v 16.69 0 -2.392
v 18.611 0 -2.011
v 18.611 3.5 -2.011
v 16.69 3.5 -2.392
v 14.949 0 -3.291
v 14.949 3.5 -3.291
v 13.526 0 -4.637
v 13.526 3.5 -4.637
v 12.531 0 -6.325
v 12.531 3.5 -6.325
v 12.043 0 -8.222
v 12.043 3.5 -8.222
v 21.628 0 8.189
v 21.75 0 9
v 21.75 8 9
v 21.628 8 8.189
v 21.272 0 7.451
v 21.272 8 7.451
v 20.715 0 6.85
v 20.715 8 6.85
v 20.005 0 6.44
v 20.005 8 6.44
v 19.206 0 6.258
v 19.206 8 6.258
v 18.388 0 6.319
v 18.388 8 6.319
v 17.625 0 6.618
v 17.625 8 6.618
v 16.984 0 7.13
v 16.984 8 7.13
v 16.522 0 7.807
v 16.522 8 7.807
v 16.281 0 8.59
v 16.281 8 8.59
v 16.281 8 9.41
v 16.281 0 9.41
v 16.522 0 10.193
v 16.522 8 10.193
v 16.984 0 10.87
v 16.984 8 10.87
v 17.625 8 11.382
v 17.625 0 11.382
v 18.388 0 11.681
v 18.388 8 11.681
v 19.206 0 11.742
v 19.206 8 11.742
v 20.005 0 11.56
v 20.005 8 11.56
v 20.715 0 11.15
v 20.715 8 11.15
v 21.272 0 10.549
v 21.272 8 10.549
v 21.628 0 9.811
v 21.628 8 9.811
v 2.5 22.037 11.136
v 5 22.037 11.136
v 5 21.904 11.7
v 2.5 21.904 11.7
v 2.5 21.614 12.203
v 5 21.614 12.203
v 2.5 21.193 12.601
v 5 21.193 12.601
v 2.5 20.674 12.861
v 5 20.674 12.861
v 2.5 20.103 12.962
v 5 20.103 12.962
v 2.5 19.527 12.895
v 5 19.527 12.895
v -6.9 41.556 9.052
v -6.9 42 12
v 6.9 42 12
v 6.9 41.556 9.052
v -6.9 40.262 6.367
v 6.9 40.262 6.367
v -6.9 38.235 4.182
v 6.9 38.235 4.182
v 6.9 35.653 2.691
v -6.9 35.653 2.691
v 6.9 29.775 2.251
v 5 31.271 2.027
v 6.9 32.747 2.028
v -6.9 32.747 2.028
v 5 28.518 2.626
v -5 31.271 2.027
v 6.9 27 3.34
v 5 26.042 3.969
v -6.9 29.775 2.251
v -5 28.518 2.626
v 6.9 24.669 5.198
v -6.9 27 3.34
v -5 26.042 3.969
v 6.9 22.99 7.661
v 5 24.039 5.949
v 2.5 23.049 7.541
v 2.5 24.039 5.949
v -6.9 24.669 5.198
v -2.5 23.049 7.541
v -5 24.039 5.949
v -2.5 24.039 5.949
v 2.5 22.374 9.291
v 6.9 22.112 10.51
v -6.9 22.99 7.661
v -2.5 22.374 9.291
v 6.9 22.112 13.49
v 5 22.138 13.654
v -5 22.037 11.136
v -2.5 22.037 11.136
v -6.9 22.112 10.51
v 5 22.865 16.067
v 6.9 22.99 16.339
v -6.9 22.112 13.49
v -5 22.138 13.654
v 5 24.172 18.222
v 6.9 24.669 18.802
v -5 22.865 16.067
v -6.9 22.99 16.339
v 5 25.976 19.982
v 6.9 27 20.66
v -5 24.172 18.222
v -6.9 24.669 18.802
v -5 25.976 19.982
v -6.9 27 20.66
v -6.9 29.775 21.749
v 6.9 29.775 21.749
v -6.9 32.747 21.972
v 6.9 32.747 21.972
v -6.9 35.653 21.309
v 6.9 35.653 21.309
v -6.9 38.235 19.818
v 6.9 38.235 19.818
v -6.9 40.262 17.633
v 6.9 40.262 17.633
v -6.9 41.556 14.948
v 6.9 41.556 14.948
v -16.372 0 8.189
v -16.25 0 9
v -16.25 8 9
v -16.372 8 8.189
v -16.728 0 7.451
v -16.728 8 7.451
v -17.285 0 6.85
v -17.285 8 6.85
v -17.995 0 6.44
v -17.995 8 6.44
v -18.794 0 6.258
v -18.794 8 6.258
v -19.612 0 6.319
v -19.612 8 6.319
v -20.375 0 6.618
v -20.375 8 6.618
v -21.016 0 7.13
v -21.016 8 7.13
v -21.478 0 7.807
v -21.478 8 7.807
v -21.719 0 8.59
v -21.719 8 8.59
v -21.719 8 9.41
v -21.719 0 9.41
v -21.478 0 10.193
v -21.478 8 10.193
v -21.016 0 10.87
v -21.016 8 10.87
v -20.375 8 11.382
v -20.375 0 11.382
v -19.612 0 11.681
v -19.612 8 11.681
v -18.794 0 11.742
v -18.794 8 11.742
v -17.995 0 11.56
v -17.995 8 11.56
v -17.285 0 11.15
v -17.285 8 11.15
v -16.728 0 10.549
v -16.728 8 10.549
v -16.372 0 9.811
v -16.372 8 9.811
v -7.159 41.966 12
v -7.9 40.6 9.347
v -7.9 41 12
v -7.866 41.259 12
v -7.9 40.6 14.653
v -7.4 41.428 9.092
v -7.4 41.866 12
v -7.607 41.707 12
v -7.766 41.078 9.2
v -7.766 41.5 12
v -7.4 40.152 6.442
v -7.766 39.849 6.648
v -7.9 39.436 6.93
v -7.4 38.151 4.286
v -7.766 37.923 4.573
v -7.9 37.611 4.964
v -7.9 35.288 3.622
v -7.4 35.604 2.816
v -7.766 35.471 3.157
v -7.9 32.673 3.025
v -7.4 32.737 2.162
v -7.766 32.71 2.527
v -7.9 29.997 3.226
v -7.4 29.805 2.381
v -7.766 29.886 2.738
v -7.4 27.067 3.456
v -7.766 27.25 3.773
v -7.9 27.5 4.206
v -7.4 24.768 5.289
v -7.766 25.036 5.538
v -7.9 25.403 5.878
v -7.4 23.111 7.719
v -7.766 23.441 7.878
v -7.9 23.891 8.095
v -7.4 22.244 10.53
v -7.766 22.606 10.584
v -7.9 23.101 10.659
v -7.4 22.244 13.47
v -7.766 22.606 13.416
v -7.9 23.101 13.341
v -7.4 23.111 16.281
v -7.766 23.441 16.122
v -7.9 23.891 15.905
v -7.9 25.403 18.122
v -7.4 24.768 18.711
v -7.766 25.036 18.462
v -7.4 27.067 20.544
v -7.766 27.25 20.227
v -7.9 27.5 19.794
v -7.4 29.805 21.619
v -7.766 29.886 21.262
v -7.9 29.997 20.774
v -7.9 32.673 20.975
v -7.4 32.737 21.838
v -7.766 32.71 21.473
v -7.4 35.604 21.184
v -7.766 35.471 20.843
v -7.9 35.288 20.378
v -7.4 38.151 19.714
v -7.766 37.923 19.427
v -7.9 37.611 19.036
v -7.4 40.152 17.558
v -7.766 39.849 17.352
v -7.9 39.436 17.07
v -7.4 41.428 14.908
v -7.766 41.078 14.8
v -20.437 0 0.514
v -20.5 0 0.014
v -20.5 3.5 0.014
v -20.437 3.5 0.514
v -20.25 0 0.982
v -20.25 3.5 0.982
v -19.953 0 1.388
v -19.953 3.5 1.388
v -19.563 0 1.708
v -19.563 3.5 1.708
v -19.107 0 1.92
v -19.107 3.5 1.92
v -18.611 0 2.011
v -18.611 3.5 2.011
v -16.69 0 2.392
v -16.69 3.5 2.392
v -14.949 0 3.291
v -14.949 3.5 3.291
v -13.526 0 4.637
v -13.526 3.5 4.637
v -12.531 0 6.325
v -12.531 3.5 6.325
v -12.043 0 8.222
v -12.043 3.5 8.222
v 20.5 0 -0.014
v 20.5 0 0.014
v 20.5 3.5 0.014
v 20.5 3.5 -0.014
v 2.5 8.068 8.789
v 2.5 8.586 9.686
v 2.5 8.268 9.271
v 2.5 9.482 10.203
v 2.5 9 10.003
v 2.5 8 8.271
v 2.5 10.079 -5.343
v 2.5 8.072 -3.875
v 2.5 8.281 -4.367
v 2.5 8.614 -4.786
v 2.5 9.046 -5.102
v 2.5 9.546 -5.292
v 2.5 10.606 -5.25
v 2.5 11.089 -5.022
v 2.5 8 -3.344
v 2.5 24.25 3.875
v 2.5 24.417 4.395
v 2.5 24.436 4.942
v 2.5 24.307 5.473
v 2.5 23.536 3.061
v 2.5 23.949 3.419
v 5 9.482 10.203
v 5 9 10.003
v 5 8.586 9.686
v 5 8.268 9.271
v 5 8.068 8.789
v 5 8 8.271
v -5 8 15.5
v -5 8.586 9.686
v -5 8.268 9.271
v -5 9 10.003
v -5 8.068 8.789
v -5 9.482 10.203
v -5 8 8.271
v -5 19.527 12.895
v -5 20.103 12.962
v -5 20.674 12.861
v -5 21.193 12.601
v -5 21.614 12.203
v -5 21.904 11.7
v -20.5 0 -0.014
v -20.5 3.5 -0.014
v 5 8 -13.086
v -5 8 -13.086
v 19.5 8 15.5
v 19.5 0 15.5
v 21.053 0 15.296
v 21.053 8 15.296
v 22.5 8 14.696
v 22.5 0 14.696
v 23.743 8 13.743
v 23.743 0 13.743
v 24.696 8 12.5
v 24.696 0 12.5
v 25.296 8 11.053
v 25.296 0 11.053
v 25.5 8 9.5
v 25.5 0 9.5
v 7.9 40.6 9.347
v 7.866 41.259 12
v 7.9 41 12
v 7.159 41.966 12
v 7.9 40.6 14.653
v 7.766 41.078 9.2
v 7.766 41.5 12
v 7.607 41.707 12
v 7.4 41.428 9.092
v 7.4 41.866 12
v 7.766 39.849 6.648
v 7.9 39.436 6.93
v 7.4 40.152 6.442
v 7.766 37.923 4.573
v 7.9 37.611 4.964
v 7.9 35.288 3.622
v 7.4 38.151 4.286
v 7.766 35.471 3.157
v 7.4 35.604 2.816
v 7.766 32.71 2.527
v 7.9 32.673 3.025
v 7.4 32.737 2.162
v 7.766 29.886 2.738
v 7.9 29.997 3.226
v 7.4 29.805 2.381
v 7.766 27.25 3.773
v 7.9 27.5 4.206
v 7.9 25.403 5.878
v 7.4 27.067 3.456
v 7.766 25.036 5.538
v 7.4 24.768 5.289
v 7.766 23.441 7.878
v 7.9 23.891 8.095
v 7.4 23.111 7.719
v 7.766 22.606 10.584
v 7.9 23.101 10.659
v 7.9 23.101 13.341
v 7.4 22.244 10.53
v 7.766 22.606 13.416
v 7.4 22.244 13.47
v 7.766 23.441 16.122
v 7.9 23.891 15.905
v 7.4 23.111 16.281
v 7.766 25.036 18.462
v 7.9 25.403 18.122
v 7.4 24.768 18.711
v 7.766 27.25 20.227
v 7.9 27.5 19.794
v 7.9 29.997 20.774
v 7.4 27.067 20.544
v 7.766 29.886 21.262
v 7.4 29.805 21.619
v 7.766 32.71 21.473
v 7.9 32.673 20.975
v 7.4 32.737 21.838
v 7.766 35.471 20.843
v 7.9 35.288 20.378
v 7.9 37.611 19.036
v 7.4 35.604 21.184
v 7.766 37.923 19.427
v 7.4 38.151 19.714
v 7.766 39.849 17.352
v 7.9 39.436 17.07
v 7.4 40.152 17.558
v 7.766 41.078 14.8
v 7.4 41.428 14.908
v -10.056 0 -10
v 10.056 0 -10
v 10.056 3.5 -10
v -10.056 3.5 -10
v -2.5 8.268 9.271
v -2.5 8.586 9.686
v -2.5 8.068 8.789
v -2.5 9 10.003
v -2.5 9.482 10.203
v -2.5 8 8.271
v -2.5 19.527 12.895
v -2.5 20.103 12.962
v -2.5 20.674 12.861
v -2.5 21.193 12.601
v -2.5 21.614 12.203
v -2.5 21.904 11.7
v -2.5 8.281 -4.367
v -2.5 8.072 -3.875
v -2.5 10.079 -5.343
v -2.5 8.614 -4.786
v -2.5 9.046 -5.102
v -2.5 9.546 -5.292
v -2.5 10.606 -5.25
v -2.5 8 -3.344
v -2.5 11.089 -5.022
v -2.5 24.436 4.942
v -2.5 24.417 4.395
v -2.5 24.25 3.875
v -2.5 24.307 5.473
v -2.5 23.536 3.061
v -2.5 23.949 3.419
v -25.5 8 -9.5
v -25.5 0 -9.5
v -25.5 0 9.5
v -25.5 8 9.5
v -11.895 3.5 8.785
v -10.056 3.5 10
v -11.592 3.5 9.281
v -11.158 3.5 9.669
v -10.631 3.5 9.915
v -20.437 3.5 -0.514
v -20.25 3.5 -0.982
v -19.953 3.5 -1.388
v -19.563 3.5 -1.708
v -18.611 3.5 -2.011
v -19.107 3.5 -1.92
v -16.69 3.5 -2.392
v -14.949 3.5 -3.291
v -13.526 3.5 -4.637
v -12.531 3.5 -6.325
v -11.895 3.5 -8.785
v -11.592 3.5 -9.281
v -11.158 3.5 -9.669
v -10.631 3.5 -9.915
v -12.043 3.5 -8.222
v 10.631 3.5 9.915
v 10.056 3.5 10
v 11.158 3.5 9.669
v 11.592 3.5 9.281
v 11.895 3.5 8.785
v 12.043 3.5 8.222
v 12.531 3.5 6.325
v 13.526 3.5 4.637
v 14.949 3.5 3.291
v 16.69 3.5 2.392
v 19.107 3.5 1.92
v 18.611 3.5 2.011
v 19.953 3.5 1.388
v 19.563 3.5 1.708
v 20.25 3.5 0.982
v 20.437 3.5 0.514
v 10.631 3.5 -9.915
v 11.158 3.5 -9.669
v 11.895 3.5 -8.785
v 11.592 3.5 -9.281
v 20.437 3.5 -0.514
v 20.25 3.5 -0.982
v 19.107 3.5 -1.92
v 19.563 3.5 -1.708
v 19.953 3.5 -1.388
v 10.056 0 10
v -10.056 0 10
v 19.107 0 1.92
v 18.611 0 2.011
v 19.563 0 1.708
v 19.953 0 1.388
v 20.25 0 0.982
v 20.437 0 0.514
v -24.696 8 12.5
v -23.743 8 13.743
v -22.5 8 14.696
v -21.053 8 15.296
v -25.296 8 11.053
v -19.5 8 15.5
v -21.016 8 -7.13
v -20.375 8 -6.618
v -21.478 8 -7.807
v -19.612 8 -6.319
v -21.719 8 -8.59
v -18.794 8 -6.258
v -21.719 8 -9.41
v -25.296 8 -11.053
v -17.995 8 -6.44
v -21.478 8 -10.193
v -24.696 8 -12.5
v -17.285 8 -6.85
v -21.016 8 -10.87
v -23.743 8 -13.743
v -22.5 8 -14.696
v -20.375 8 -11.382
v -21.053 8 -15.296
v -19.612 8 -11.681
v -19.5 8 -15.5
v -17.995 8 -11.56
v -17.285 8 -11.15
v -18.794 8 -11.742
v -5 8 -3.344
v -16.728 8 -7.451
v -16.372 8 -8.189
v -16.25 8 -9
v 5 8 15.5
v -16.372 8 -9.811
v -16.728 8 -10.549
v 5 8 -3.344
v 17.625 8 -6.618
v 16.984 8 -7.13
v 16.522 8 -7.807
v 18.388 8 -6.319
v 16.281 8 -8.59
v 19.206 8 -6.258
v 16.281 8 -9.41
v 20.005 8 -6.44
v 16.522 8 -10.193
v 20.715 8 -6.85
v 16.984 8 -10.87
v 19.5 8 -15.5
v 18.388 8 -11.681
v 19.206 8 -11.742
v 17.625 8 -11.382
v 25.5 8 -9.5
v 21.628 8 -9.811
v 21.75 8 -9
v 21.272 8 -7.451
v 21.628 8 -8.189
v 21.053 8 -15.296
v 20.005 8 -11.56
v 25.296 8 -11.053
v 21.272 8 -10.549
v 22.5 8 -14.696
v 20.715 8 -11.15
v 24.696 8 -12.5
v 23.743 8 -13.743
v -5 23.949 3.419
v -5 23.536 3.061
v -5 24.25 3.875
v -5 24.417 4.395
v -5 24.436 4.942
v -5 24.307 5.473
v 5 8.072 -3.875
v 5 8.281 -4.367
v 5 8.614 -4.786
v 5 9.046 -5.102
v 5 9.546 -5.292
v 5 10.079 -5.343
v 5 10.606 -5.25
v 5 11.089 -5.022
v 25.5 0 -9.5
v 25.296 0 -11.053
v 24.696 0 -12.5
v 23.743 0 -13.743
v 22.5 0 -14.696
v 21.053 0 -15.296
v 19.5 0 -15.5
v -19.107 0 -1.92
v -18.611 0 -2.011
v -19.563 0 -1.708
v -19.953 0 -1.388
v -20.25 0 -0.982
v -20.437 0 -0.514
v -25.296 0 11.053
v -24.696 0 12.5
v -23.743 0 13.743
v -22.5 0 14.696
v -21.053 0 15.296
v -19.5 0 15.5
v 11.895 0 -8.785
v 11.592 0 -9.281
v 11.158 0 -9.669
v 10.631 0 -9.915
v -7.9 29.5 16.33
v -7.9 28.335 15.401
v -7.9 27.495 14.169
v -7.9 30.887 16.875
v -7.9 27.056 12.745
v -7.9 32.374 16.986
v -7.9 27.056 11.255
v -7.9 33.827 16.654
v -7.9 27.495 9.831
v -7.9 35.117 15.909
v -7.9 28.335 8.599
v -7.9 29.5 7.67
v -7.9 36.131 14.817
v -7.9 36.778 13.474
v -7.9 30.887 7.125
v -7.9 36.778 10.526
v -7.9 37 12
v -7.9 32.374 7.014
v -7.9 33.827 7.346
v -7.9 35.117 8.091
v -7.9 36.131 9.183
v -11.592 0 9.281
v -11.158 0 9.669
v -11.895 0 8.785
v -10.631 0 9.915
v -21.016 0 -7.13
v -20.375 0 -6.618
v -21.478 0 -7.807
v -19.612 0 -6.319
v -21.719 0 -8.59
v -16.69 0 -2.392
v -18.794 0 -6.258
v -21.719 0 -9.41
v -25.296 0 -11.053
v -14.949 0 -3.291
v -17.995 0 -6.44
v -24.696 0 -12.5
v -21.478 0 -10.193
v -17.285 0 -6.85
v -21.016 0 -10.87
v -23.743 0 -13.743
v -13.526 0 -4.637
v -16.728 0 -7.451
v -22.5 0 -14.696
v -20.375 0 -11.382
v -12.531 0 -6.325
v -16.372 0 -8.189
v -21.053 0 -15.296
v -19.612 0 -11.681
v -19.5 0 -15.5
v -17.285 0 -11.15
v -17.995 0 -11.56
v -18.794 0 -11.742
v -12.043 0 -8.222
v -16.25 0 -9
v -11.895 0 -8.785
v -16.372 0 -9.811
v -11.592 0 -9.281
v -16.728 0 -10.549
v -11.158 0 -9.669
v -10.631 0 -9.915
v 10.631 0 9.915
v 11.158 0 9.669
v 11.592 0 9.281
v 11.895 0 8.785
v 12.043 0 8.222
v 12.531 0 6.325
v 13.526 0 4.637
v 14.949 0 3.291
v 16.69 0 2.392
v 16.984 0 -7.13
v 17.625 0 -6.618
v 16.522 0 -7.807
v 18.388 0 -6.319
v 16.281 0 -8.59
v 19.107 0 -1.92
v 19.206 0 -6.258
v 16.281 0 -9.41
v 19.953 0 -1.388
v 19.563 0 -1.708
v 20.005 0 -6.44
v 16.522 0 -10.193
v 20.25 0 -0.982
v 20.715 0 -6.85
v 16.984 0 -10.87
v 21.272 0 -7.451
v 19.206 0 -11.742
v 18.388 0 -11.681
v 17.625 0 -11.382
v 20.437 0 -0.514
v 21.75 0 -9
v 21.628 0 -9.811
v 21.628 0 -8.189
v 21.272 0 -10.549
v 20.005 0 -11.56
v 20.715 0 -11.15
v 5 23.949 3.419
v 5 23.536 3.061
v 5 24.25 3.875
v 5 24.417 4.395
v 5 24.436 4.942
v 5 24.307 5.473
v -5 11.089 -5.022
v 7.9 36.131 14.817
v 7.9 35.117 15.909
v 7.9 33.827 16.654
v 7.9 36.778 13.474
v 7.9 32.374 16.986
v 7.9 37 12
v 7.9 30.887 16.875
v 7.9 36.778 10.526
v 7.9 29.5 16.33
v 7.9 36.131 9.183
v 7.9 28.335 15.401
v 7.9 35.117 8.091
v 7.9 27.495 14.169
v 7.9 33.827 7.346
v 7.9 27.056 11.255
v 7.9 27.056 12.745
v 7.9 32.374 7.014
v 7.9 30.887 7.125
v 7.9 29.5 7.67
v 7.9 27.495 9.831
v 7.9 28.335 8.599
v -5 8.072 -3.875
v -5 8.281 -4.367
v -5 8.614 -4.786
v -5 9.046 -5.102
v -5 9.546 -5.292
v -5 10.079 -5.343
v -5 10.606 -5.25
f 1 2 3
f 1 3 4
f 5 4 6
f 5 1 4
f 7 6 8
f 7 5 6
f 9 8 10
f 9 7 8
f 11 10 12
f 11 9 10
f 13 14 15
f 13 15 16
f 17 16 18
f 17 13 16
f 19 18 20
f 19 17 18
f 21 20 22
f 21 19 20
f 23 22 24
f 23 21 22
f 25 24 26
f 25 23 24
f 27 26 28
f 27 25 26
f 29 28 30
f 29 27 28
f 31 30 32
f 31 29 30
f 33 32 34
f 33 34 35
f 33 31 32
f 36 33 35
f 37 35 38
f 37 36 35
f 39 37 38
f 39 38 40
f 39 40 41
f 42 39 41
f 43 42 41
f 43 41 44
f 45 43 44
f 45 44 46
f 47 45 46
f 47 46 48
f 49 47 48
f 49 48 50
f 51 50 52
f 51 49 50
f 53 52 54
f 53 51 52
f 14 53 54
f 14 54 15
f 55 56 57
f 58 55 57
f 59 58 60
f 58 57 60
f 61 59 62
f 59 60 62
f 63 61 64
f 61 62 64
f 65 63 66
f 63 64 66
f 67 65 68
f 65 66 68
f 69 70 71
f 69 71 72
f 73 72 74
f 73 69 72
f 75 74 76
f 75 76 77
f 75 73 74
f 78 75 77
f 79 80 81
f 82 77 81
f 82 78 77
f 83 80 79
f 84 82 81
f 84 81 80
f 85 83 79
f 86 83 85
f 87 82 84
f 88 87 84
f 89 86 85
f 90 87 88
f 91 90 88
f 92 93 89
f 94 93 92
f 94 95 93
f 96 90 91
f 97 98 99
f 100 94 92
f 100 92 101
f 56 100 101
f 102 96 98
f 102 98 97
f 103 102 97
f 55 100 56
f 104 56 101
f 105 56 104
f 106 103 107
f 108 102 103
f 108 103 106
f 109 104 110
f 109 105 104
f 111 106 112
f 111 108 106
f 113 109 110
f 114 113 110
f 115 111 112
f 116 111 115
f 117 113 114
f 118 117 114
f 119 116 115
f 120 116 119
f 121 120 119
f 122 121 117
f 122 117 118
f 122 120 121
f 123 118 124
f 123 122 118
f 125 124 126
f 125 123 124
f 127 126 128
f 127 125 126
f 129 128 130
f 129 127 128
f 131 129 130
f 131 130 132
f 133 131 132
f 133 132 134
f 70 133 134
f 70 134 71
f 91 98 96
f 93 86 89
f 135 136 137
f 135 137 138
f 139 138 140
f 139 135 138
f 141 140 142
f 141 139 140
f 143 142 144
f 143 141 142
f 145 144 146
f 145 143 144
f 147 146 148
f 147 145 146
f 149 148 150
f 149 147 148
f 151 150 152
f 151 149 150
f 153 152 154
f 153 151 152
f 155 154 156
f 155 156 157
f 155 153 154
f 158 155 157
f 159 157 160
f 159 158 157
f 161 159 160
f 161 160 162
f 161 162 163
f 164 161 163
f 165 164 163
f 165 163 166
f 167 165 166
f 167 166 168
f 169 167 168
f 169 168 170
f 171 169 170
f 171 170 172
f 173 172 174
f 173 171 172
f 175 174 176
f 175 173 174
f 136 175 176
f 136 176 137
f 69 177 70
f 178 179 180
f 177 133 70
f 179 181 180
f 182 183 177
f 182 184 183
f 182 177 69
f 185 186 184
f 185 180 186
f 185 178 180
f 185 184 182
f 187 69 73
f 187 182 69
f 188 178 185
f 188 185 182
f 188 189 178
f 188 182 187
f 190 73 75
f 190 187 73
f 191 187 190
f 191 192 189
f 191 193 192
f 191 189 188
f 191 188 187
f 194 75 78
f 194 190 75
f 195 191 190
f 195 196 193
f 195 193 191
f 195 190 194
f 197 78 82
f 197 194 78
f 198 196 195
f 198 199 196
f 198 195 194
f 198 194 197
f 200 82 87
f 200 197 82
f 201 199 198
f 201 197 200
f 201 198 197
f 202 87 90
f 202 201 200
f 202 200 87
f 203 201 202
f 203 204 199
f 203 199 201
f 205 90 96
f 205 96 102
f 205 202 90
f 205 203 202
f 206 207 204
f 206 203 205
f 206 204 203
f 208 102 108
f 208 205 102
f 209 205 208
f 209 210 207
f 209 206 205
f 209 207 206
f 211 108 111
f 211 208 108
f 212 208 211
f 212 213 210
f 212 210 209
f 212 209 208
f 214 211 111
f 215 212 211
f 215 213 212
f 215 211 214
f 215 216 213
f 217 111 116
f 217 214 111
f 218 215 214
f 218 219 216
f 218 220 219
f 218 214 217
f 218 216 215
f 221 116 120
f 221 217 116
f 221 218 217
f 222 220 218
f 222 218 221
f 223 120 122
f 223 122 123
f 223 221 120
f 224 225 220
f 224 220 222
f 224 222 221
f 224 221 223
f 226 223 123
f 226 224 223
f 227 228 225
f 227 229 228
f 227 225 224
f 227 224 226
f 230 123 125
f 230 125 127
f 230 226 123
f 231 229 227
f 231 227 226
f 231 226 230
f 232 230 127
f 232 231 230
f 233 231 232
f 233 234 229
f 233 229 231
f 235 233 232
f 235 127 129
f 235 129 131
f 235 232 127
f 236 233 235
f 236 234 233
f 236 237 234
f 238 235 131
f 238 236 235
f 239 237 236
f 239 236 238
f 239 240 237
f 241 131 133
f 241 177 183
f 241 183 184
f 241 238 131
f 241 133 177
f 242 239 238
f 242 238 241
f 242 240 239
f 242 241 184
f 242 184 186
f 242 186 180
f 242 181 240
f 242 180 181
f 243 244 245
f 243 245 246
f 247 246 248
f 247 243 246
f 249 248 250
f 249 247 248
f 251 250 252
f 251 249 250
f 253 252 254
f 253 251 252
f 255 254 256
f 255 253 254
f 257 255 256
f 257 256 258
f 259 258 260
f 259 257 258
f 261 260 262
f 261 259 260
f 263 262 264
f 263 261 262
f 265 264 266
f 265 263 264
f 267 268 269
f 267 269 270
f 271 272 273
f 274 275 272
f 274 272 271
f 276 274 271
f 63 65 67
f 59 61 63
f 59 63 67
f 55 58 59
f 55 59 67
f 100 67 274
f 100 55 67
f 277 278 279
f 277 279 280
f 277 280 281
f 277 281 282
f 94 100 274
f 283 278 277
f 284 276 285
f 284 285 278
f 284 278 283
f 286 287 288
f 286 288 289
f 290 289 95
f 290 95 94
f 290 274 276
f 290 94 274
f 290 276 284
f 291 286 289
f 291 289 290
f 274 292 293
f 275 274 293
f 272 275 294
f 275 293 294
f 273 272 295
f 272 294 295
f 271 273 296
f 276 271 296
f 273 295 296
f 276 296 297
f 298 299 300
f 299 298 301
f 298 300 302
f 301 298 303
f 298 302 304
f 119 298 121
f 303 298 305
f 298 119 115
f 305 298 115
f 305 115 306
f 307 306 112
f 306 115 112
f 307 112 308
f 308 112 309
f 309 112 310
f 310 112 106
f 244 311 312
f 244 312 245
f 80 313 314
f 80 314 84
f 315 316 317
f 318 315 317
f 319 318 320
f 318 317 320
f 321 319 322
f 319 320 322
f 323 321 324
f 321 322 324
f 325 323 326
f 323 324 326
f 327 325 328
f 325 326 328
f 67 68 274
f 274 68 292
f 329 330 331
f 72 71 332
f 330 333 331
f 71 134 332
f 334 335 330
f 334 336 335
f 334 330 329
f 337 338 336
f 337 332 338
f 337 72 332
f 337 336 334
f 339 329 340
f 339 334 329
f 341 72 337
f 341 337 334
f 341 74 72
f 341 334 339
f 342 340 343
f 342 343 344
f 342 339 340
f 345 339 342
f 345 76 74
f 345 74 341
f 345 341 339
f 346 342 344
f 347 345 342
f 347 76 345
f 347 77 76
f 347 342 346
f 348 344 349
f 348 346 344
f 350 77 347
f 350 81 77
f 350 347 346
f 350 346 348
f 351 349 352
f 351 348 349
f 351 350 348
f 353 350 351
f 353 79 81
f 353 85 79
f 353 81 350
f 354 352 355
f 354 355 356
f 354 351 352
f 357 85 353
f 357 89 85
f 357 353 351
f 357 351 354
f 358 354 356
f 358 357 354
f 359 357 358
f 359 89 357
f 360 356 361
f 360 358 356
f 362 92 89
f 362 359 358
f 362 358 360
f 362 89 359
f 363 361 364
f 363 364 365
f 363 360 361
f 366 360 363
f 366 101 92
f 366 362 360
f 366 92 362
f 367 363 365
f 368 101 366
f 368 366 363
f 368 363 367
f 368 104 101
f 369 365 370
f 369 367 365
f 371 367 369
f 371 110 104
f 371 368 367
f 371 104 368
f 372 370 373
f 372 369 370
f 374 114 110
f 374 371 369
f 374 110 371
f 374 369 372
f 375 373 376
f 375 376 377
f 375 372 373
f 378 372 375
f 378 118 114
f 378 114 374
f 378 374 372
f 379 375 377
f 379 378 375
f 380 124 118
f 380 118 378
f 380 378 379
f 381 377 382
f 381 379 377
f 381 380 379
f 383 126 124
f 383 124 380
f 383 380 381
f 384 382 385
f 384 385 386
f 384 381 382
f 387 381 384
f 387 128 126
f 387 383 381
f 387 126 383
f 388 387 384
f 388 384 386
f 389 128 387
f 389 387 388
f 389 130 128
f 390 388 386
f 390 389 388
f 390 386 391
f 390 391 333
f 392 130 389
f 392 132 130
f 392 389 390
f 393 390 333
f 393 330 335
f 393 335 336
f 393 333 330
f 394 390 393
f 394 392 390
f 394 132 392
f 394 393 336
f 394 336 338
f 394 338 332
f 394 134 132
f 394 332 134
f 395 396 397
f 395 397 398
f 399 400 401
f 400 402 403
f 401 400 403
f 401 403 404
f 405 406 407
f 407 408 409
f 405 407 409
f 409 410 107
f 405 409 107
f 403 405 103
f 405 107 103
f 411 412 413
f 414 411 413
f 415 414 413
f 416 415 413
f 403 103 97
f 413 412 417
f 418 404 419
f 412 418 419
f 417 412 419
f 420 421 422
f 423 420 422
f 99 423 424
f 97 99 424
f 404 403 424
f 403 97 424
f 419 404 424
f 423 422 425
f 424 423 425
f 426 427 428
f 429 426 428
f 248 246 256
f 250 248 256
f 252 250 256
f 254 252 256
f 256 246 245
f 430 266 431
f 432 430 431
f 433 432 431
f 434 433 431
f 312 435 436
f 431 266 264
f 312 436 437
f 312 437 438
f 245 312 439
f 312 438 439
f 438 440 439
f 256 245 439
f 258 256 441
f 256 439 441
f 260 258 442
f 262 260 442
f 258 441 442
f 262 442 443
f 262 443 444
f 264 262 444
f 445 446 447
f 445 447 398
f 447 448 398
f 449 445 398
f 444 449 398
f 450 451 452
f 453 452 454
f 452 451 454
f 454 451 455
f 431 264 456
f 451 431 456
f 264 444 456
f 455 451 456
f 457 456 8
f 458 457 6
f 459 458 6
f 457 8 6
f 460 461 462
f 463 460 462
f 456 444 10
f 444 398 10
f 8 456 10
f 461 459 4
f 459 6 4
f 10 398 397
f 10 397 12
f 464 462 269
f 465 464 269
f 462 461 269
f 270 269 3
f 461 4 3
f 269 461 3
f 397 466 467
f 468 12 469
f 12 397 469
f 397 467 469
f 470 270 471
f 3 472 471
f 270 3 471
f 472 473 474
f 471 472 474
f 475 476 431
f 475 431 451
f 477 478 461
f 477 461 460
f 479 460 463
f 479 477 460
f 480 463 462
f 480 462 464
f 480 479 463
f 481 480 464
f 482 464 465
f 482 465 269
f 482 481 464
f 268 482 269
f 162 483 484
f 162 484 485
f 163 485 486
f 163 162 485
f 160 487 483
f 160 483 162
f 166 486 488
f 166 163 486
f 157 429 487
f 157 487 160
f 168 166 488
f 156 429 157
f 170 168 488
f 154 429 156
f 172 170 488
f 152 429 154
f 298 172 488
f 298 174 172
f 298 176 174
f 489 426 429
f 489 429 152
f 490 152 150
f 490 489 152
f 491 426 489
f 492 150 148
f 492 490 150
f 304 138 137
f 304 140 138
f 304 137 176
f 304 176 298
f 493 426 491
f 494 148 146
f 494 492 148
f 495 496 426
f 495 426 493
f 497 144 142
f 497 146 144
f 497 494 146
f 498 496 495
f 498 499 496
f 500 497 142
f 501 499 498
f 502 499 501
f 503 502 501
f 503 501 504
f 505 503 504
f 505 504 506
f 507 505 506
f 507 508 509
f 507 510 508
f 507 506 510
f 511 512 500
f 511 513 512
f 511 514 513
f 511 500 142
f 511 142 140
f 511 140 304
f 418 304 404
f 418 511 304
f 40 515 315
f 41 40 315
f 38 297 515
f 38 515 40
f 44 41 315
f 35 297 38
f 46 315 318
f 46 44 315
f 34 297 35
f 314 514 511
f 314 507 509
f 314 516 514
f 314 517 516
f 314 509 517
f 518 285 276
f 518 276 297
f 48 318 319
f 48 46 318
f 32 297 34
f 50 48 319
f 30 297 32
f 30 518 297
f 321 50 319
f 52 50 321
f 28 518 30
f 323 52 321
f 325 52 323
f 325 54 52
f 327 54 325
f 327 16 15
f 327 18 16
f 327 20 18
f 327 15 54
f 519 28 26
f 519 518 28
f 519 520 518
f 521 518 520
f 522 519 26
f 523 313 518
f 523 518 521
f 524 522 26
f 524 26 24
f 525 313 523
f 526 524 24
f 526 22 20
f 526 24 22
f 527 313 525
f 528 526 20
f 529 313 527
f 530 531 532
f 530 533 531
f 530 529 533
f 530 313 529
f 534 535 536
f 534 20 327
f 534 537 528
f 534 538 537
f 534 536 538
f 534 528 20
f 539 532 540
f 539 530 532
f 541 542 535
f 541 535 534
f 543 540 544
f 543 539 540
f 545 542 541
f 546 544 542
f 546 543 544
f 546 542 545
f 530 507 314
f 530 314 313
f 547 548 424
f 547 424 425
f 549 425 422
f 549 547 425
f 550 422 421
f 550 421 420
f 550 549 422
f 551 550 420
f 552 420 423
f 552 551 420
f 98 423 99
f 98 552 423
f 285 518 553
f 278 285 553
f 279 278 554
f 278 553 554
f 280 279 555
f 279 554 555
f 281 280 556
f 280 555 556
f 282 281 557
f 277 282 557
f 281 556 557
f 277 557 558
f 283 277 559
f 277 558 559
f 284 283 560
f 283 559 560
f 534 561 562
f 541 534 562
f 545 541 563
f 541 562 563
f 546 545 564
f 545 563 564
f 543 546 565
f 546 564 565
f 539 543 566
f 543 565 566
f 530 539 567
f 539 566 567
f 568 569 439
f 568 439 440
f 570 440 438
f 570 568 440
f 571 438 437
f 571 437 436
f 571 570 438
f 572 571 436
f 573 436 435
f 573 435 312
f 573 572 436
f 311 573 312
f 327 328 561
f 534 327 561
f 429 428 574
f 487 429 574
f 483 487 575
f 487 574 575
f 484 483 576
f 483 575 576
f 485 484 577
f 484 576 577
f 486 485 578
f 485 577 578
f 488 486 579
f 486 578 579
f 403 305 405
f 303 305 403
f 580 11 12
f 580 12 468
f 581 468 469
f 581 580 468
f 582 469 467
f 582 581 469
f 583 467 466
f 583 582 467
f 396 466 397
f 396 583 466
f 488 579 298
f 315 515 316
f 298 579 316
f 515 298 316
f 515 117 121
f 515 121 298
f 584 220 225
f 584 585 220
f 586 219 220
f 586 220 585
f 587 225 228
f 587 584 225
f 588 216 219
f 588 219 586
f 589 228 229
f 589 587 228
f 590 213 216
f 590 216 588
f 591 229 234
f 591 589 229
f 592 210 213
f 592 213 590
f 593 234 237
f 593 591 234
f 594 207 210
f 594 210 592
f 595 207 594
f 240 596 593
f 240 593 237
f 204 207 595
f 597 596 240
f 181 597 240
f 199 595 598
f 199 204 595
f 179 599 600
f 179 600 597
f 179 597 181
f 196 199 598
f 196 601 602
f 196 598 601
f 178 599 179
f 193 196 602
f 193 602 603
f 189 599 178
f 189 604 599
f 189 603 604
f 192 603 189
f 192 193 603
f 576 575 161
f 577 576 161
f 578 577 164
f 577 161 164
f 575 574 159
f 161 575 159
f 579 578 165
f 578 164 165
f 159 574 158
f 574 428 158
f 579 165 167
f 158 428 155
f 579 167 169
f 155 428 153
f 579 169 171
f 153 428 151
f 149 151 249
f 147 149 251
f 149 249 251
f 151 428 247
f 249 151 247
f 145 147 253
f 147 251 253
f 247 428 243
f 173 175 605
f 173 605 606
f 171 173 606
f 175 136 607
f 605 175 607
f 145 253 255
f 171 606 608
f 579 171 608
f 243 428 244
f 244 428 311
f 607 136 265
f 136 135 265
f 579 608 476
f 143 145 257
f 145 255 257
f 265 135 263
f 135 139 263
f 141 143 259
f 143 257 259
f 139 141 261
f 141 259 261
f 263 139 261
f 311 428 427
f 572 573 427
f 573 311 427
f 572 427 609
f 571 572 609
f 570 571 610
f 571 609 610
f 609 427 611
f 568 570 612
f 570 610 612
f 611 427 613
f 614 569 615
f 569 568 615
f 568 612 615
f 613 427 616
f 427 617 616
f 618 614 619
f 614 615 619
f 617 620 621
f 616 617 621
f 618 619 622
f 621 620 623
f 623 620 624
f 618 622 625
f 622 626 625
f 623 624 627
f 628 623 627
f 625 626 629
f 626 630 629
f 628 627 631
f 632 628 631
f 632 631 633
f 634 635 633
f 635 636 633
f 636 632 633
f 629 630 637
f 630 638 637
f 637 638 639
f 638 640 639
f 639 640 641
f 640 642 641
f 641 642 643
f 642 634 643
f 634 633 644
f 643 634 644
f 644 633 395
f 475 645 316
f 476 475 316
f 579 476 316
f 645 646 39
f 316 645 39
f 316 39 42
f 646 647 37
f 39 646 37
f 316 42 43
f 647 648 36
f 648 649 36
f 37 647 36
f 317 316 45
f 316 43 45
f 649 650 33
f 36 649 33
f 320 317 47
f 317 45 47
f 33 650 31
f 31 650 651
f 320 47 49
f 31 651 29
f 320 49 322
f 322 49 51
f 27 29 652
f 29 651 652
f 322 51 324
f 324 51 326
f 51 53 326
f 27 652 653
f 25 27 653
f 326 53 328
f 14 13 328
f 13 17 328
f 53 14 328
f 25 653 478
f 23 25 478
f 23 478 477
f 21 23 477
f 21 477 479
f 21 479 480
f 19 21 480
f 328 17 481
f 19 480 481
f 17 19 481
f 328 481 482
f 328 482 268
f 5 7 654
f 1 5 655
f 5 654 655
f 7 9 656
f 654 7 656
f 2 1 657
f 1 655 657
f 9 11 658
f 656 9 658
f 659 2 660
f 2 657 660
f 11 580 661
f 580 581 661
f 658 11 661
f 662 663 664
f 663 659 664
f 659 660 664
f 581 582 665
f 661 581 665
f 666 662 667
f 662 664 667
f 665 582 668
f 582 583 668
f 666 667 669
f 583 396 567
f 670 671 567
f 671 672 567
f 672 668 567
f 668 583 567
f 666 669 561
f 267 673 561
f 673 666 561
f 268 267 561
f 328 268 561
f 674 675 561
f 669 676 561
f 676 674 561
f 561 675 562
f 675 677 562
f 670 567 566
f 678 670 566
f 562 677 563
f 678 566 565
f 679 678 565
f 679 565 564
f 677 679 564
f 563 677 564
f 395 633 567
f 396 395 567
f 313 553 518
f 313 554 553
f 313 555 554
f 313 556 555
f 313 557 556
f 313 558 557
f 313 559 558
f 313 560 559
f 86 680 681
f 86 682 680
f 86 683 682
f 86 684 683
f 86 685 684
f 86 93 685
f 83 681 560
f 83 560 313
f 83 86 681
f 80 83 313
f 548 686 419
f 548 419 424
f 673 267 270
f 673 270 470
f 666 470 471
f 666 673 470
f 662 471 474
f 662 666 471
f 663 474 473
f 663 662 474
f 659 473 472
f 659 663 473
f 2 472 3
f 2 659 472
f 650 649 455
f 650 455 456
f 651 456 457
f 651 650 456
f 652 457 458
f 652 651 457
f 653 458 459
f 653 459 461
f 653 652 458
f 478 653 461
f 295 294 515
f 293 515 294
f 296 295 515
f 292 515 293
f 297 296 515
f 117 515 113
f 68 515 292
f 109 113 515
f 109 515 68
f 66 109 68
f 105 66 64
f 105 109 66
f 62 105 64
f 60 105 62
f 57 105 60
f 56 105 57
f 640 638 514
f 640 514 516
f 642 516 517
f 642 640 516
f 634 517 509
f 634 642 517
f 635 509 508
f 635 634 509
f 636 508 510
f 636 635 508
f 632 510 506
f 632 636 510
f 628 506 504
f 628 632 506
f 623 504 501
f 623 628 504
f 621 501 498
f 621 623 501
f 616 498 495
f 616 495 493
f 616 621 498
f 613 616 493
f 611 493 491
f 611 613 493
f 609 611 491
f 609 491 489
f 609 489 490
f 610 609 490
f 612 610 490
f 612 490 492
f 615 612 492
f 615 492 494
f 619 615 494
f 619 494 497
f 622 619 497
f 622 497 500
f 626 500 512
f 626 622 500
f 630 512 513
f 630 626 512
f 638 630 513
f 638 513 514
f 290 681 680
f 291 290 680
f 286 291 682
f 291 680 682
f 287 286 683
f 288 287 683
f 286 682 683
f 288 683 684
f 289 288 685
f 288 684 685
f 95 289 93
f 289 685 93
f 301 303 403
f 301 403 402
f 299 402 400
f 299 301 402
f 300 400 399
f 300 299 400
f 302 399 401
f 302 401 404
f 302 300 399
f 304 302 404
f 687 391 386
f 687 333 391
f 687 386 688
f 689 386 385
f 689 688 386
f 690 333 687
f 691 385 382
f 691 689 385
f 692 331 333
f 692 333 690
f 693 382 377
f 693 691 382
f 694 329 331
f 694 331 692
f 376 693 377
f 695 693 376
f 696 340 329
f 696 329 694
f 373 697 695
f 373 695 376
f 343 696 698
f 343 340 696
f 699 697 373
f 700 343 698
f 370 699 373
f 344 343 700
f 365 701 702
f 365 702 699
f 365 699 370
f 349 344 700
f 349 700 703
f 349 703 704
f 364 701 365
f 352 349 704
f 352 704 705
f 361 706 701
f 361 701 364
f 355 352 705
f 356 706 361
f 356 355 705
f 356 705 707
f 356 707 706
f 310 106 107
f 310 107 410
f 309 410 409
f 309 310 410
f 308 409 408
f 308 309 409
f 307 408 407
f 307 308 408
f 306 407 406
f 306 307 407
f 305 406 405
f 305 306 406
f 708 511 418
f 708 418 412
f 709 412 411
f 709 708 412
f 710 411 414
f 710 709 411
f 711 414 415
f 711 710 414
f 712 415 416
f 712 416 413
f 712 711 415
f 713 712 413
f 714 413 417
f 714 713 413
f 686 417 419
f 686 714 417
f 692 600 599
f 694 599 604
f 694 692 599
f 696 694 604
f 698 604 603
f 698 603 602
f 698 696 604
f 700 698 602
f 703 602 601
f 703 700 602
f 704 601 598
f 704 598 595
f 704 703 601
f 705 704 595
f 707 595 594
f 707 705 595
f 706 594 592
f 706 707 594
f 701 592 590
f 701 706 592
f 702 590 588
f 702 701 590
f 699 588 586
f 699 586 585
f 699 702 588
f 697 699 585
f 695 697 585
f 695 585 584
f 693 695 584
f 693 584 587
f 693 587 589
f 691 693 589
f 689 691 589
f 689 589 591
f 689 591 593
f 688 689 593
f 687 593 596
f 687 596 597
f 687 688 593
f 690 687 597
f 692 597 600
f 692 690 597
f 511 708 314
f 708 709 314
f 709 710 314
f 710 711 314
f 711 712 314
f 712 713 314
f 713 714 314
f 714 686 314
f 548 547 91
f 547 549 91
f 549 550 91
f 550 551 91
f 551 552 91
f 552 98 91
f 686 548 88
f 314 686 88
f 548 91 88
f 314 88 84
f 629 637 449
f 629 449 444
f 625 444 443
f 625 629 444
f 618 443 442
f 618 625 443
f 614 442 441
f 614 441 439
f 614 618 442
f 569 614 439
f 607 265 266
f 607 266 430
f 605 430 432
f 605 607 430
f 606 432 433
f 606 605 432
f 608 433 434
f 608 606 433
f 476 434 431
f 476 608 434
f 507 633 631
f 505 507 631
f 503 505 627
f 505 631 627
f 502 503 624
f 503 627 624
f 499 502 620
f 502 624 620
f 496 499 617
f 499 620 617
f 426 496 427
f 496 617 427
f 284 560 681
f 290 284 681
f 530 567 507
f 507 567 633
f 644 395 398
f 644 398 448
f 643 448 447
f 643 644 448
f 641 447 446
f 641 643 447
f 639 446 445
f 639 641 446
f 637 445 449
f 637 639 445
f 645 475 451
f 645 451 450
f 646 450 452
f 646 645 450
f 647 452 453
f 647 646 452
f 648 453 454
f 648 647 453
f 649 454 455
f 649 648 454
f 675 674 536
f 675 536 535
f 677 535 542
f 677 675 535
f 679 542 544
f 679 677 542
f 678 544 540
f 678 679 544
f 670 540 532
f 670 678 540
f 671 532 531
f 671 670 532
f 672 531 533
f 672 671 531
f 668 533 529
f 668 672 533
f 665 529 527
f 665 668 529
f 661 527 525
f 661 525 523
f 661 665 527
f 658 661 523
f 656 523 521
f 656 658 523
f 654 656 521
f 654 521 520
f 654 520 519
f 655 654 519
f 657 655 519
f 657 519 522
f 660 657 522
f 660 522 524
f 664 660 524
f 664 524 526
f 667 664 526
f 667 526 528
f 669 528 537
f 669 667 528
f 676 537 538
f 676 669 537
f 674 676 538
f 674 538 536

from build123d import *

# Parameters (mm, degrees)
SKETCH1_R                = 2.75
BOSS_EXTRUDE1_DEPTH      = 8
BOSS_EXTRUDE2_DEPTH      = 5
BOSS_EXTRUDE2_DEPTH_BACK = 5
CUT_EXTRUDE1_DEPTH       = 2.5
CUT_EXTRUDE2_DEPTH       = 2.5
CUT_EXTRUDE3_DEPTH       = 3.5


with BuildPart() as part:
    # Sketch1 → Boss-Extrude1 (new body)
    with BuildSketch(Plane(origin=(0, 0, 0), x_dir=(1, 0, 0), z_dir=(0, 1, 0))):
        with BuildLine():
            Line((-19.5, -15.5), (19.5, -15.5))
            ThreePointArc((19.5, -15.5), (23.742640687, -13.742640687), (25.5, -9.5))
            Line((25.5, -9.5), (25.5, 9.5))
            ThreePointArc((25.5, 9.5), (23.742640687, 13.742640687), (19.5, 15.5))
            Line((19.5, 15.5), (-19.5, 15.5))
            ThreePointArc((-19.5, 15.5), (-23.742640687, 13.742640687), (-25.5, 9.5))
            Line((-25.5, 9.5), (-25.5, -9.5))
            ThreePointArc((-25.5, -9.5), (-23.742640687, -13.742640687), (-19.5, -15.5))
        make_face()
        with Locations((19, 9)):
            Circle(SKETCH1_R, mode=Mode.SUBTRACT)
        with Locations((19, -9)):
            Circle(SKETCH1_R, mode=Mode.SUBTRACT)
        with Locations((-19, 9)):
            Circle(SKETCH1_R, mode=Mode.SUBTRACT)
        with Locations((-19, -9)):
            Circle(SKETCH1_R, mode=Mode.SUBTRACT)
    extrude(amount=BOSS_EXTRUDE1_DEPTH)

    # Sketch2 → Boss-Extrude2 (add, two sides)
    with BuildSketch(Plane(origin=(0, 0, 0), x_dir=(0, 0, -1), z_dir=(1, 0, 0))) as boss_extrude2_sk:
        with BuildLine():
            Line((-20.35784849, 27.483766103), (-15.5, 8))
            Line((-15.5, 8), (13.085782237, 8))
            Line((13.085782237, 8), (-2.5, 32))
            ThreePointArc((-2.5, 32), (-9.670789904, 22.789963066), (-20.35784849, 27.483766103))
        make_face()
    extrude(amount=BOSS_EXTRUDE2_DEPTH)
    extrude(boss_extrude2_sk.sketch, amount=-BOSS_EXTRUDE2_DEPTH_BACK)

    # Sketch3 → Cut-Extrude1 (cut)
    with BuildSketch(Plane(origin=(5, 0, 0), x_dir=(0, 0, -1), z_dir=(1, 0, 0))):
        with BuildLine():
            Line((-12.894702583, 19.52726585), (-10.203178684, 9.48236191))
            ThreePointArc((-10.203178684, 9.48236191), (-9.48884989, 8.413293319), (-8.271327032, 8))
            Line((-8.271327032, 8), (3.344242354, 8))
            ThreePointArc((3.344242354, 8), (5.101876579, 9.045682479), (5.02158349, 11.08927807))
            Line((5.02158349, 11.08927807), (-3.061203443, 23.535678478))
            ThreePointArc((-3.061203443, 23.535678478), (-4.395332352, 24.416731692), (-5.948787149, 24.038667007))
            ThreePointArc((-5.948787149, 24.038667007), (-8.400375652, 22.670332023), (-11.135709109, 22.03741995))
            ThreePointArc((-11.135709109, 22.03741995), (-12.60073654, 21.192654231), (-12.894702583, 19.52726585))
        make_face()
    extrude(amount=-CUT_EXTRUDE1_DEPTH, mode=Mode.SUBTRACT)

    # Sketch4 → Cut-Extrude2 (cut)
    with BuildSketch(Plane(origin=(-5, 0, 0), x_dir=(0, 0, -1), z_dir=(1, 0, 0))):
        with BuildLine():
            Line((-12.894702583, 19.52726585), (-10.203178684, 9.48236191))
            ThreePointArc((-10.203178684, 9.48236191), (-9.48884989, 8.413293319), (-8.271327032, 8))
            Line((-8.271327032, 8), (3.344242354, 8))
            ThreePointArc((3.344242354, 8), (5.101876579, 9.045682479), (5.02158349, 11.08927807))
            Line((5.02158349, 11.08927807), (-3.061203443, 23.535678478))
            ThreePointArc((-3.061203443, 23.535678478), (-4.395332352, 24.416731692), (-5.948787149, 24.038667007))
            ThreePointArc((-5.948787149, 24.038667007), (-8.400375652, 22.670332023), (-11.135709109, 22.03741995))
            ThreePointArc((-11.135709109, 22.03741995), (-12.60073654, 21.192654231), (-12.894702583, 19.52726585))
        make_face()
    extrude(amount=CUT_EXTRUDE2_DEPTH, mode=Mode.SUBTRACT)

    # Sketch5 → Revolve1 (revolve)
    with BuildSketch(Plane.XY.offset(12)):
        with BuildLine():
            Line((-7.9, 41), (-7.9, 37))
            Line((-7.9, 37), (7.9, 37))
            Line((7.9, 37), (7.9, 41))
            ThreePointArc((7.9, 41), (7.607106781, 41.707106781), (6.9, 42))
            Line((6.9, 42), (-6.9, 42))
            ThreePointArc((-6.9, 42), (-7.607106781, 41.707106781), (-7.9, 41))
        make_face()
    revolve(axis=Axis((7.9, 32, 12), (-1, 0, 0)))

    # Sketch6 → Cut-Extrude3 (cut)
    with BuildSketch(Plane(origin=(0, 0, 0), x_dir=(1, 0, 0), z_dir=(0, 1, 0))):
        with BuildLine():
            Line((-20.5, 0.013899622), (-20.5, -0.013899622))
            ThreePointArc((-20.5, -0.013899622), (-19.952966315, -1.388268164), (-18.611111111, -2.010810817))
            ThreePointArc((-18.611111111, -2.010810817), (-14.190149162, -3.914202627), (-12.04334407, -8.222222222))
            ThreePointArc((-12.04334407, -8.222222222), (-11.389061423, -9.490711985), (-10.05572809, -10))
            Line((-10.05572809, -10), (10.05572809, -10))
            ThreePointArc((10.05572809, -10), (11.389061423, -9.490711985), (12.04334407, -8.222222222))
            ThreePointArc((12.04334407, -8.222222222), (14.190149162, -3.914202627), (18.611111111, -2.010810817))
            ThreePointArc((18.611111111, -2.010810817), (19.952966315, -1.388268164), (20.5, -0.013899622))
            Line((20.5, -0.013899622), (20.5, 0.013899622))
            ThreePointArc((20.5, 0.013899622), (19.952966315, 1.388268164), (18.611111111, 2.010810817))
            ThreePointArc((18.611111111, 2.010810817), (14.190149162, 3.914202627), (12.04334407, 8.222222222))
            ThreePointArc((12.04334407, 8.222222222), (11.389061423, 9.490711985), (10.05572809, 10))
            Line((10.05572809, 10), (-10.05572809, 10))
            ThreePointArc((-10.05572809, 10), (-11.389061423, 9.490711985), (-12.04334407, 8.222222222))
            ThreePointArc((-12.04334407, 8.222222222), (-14.190149162, 3.914202627), (-18.611111111, 2.010810817))
            ThreePointArc((-18.611111111, 2.010810817), (-19.952966315, 1.388268164), (-20.5, 0.013899622))
        make_face()
    extrude(amount=CUT_EXTRUDE3_DEPTH, mode=Mode.SUBTRACT)


solid = part.part
